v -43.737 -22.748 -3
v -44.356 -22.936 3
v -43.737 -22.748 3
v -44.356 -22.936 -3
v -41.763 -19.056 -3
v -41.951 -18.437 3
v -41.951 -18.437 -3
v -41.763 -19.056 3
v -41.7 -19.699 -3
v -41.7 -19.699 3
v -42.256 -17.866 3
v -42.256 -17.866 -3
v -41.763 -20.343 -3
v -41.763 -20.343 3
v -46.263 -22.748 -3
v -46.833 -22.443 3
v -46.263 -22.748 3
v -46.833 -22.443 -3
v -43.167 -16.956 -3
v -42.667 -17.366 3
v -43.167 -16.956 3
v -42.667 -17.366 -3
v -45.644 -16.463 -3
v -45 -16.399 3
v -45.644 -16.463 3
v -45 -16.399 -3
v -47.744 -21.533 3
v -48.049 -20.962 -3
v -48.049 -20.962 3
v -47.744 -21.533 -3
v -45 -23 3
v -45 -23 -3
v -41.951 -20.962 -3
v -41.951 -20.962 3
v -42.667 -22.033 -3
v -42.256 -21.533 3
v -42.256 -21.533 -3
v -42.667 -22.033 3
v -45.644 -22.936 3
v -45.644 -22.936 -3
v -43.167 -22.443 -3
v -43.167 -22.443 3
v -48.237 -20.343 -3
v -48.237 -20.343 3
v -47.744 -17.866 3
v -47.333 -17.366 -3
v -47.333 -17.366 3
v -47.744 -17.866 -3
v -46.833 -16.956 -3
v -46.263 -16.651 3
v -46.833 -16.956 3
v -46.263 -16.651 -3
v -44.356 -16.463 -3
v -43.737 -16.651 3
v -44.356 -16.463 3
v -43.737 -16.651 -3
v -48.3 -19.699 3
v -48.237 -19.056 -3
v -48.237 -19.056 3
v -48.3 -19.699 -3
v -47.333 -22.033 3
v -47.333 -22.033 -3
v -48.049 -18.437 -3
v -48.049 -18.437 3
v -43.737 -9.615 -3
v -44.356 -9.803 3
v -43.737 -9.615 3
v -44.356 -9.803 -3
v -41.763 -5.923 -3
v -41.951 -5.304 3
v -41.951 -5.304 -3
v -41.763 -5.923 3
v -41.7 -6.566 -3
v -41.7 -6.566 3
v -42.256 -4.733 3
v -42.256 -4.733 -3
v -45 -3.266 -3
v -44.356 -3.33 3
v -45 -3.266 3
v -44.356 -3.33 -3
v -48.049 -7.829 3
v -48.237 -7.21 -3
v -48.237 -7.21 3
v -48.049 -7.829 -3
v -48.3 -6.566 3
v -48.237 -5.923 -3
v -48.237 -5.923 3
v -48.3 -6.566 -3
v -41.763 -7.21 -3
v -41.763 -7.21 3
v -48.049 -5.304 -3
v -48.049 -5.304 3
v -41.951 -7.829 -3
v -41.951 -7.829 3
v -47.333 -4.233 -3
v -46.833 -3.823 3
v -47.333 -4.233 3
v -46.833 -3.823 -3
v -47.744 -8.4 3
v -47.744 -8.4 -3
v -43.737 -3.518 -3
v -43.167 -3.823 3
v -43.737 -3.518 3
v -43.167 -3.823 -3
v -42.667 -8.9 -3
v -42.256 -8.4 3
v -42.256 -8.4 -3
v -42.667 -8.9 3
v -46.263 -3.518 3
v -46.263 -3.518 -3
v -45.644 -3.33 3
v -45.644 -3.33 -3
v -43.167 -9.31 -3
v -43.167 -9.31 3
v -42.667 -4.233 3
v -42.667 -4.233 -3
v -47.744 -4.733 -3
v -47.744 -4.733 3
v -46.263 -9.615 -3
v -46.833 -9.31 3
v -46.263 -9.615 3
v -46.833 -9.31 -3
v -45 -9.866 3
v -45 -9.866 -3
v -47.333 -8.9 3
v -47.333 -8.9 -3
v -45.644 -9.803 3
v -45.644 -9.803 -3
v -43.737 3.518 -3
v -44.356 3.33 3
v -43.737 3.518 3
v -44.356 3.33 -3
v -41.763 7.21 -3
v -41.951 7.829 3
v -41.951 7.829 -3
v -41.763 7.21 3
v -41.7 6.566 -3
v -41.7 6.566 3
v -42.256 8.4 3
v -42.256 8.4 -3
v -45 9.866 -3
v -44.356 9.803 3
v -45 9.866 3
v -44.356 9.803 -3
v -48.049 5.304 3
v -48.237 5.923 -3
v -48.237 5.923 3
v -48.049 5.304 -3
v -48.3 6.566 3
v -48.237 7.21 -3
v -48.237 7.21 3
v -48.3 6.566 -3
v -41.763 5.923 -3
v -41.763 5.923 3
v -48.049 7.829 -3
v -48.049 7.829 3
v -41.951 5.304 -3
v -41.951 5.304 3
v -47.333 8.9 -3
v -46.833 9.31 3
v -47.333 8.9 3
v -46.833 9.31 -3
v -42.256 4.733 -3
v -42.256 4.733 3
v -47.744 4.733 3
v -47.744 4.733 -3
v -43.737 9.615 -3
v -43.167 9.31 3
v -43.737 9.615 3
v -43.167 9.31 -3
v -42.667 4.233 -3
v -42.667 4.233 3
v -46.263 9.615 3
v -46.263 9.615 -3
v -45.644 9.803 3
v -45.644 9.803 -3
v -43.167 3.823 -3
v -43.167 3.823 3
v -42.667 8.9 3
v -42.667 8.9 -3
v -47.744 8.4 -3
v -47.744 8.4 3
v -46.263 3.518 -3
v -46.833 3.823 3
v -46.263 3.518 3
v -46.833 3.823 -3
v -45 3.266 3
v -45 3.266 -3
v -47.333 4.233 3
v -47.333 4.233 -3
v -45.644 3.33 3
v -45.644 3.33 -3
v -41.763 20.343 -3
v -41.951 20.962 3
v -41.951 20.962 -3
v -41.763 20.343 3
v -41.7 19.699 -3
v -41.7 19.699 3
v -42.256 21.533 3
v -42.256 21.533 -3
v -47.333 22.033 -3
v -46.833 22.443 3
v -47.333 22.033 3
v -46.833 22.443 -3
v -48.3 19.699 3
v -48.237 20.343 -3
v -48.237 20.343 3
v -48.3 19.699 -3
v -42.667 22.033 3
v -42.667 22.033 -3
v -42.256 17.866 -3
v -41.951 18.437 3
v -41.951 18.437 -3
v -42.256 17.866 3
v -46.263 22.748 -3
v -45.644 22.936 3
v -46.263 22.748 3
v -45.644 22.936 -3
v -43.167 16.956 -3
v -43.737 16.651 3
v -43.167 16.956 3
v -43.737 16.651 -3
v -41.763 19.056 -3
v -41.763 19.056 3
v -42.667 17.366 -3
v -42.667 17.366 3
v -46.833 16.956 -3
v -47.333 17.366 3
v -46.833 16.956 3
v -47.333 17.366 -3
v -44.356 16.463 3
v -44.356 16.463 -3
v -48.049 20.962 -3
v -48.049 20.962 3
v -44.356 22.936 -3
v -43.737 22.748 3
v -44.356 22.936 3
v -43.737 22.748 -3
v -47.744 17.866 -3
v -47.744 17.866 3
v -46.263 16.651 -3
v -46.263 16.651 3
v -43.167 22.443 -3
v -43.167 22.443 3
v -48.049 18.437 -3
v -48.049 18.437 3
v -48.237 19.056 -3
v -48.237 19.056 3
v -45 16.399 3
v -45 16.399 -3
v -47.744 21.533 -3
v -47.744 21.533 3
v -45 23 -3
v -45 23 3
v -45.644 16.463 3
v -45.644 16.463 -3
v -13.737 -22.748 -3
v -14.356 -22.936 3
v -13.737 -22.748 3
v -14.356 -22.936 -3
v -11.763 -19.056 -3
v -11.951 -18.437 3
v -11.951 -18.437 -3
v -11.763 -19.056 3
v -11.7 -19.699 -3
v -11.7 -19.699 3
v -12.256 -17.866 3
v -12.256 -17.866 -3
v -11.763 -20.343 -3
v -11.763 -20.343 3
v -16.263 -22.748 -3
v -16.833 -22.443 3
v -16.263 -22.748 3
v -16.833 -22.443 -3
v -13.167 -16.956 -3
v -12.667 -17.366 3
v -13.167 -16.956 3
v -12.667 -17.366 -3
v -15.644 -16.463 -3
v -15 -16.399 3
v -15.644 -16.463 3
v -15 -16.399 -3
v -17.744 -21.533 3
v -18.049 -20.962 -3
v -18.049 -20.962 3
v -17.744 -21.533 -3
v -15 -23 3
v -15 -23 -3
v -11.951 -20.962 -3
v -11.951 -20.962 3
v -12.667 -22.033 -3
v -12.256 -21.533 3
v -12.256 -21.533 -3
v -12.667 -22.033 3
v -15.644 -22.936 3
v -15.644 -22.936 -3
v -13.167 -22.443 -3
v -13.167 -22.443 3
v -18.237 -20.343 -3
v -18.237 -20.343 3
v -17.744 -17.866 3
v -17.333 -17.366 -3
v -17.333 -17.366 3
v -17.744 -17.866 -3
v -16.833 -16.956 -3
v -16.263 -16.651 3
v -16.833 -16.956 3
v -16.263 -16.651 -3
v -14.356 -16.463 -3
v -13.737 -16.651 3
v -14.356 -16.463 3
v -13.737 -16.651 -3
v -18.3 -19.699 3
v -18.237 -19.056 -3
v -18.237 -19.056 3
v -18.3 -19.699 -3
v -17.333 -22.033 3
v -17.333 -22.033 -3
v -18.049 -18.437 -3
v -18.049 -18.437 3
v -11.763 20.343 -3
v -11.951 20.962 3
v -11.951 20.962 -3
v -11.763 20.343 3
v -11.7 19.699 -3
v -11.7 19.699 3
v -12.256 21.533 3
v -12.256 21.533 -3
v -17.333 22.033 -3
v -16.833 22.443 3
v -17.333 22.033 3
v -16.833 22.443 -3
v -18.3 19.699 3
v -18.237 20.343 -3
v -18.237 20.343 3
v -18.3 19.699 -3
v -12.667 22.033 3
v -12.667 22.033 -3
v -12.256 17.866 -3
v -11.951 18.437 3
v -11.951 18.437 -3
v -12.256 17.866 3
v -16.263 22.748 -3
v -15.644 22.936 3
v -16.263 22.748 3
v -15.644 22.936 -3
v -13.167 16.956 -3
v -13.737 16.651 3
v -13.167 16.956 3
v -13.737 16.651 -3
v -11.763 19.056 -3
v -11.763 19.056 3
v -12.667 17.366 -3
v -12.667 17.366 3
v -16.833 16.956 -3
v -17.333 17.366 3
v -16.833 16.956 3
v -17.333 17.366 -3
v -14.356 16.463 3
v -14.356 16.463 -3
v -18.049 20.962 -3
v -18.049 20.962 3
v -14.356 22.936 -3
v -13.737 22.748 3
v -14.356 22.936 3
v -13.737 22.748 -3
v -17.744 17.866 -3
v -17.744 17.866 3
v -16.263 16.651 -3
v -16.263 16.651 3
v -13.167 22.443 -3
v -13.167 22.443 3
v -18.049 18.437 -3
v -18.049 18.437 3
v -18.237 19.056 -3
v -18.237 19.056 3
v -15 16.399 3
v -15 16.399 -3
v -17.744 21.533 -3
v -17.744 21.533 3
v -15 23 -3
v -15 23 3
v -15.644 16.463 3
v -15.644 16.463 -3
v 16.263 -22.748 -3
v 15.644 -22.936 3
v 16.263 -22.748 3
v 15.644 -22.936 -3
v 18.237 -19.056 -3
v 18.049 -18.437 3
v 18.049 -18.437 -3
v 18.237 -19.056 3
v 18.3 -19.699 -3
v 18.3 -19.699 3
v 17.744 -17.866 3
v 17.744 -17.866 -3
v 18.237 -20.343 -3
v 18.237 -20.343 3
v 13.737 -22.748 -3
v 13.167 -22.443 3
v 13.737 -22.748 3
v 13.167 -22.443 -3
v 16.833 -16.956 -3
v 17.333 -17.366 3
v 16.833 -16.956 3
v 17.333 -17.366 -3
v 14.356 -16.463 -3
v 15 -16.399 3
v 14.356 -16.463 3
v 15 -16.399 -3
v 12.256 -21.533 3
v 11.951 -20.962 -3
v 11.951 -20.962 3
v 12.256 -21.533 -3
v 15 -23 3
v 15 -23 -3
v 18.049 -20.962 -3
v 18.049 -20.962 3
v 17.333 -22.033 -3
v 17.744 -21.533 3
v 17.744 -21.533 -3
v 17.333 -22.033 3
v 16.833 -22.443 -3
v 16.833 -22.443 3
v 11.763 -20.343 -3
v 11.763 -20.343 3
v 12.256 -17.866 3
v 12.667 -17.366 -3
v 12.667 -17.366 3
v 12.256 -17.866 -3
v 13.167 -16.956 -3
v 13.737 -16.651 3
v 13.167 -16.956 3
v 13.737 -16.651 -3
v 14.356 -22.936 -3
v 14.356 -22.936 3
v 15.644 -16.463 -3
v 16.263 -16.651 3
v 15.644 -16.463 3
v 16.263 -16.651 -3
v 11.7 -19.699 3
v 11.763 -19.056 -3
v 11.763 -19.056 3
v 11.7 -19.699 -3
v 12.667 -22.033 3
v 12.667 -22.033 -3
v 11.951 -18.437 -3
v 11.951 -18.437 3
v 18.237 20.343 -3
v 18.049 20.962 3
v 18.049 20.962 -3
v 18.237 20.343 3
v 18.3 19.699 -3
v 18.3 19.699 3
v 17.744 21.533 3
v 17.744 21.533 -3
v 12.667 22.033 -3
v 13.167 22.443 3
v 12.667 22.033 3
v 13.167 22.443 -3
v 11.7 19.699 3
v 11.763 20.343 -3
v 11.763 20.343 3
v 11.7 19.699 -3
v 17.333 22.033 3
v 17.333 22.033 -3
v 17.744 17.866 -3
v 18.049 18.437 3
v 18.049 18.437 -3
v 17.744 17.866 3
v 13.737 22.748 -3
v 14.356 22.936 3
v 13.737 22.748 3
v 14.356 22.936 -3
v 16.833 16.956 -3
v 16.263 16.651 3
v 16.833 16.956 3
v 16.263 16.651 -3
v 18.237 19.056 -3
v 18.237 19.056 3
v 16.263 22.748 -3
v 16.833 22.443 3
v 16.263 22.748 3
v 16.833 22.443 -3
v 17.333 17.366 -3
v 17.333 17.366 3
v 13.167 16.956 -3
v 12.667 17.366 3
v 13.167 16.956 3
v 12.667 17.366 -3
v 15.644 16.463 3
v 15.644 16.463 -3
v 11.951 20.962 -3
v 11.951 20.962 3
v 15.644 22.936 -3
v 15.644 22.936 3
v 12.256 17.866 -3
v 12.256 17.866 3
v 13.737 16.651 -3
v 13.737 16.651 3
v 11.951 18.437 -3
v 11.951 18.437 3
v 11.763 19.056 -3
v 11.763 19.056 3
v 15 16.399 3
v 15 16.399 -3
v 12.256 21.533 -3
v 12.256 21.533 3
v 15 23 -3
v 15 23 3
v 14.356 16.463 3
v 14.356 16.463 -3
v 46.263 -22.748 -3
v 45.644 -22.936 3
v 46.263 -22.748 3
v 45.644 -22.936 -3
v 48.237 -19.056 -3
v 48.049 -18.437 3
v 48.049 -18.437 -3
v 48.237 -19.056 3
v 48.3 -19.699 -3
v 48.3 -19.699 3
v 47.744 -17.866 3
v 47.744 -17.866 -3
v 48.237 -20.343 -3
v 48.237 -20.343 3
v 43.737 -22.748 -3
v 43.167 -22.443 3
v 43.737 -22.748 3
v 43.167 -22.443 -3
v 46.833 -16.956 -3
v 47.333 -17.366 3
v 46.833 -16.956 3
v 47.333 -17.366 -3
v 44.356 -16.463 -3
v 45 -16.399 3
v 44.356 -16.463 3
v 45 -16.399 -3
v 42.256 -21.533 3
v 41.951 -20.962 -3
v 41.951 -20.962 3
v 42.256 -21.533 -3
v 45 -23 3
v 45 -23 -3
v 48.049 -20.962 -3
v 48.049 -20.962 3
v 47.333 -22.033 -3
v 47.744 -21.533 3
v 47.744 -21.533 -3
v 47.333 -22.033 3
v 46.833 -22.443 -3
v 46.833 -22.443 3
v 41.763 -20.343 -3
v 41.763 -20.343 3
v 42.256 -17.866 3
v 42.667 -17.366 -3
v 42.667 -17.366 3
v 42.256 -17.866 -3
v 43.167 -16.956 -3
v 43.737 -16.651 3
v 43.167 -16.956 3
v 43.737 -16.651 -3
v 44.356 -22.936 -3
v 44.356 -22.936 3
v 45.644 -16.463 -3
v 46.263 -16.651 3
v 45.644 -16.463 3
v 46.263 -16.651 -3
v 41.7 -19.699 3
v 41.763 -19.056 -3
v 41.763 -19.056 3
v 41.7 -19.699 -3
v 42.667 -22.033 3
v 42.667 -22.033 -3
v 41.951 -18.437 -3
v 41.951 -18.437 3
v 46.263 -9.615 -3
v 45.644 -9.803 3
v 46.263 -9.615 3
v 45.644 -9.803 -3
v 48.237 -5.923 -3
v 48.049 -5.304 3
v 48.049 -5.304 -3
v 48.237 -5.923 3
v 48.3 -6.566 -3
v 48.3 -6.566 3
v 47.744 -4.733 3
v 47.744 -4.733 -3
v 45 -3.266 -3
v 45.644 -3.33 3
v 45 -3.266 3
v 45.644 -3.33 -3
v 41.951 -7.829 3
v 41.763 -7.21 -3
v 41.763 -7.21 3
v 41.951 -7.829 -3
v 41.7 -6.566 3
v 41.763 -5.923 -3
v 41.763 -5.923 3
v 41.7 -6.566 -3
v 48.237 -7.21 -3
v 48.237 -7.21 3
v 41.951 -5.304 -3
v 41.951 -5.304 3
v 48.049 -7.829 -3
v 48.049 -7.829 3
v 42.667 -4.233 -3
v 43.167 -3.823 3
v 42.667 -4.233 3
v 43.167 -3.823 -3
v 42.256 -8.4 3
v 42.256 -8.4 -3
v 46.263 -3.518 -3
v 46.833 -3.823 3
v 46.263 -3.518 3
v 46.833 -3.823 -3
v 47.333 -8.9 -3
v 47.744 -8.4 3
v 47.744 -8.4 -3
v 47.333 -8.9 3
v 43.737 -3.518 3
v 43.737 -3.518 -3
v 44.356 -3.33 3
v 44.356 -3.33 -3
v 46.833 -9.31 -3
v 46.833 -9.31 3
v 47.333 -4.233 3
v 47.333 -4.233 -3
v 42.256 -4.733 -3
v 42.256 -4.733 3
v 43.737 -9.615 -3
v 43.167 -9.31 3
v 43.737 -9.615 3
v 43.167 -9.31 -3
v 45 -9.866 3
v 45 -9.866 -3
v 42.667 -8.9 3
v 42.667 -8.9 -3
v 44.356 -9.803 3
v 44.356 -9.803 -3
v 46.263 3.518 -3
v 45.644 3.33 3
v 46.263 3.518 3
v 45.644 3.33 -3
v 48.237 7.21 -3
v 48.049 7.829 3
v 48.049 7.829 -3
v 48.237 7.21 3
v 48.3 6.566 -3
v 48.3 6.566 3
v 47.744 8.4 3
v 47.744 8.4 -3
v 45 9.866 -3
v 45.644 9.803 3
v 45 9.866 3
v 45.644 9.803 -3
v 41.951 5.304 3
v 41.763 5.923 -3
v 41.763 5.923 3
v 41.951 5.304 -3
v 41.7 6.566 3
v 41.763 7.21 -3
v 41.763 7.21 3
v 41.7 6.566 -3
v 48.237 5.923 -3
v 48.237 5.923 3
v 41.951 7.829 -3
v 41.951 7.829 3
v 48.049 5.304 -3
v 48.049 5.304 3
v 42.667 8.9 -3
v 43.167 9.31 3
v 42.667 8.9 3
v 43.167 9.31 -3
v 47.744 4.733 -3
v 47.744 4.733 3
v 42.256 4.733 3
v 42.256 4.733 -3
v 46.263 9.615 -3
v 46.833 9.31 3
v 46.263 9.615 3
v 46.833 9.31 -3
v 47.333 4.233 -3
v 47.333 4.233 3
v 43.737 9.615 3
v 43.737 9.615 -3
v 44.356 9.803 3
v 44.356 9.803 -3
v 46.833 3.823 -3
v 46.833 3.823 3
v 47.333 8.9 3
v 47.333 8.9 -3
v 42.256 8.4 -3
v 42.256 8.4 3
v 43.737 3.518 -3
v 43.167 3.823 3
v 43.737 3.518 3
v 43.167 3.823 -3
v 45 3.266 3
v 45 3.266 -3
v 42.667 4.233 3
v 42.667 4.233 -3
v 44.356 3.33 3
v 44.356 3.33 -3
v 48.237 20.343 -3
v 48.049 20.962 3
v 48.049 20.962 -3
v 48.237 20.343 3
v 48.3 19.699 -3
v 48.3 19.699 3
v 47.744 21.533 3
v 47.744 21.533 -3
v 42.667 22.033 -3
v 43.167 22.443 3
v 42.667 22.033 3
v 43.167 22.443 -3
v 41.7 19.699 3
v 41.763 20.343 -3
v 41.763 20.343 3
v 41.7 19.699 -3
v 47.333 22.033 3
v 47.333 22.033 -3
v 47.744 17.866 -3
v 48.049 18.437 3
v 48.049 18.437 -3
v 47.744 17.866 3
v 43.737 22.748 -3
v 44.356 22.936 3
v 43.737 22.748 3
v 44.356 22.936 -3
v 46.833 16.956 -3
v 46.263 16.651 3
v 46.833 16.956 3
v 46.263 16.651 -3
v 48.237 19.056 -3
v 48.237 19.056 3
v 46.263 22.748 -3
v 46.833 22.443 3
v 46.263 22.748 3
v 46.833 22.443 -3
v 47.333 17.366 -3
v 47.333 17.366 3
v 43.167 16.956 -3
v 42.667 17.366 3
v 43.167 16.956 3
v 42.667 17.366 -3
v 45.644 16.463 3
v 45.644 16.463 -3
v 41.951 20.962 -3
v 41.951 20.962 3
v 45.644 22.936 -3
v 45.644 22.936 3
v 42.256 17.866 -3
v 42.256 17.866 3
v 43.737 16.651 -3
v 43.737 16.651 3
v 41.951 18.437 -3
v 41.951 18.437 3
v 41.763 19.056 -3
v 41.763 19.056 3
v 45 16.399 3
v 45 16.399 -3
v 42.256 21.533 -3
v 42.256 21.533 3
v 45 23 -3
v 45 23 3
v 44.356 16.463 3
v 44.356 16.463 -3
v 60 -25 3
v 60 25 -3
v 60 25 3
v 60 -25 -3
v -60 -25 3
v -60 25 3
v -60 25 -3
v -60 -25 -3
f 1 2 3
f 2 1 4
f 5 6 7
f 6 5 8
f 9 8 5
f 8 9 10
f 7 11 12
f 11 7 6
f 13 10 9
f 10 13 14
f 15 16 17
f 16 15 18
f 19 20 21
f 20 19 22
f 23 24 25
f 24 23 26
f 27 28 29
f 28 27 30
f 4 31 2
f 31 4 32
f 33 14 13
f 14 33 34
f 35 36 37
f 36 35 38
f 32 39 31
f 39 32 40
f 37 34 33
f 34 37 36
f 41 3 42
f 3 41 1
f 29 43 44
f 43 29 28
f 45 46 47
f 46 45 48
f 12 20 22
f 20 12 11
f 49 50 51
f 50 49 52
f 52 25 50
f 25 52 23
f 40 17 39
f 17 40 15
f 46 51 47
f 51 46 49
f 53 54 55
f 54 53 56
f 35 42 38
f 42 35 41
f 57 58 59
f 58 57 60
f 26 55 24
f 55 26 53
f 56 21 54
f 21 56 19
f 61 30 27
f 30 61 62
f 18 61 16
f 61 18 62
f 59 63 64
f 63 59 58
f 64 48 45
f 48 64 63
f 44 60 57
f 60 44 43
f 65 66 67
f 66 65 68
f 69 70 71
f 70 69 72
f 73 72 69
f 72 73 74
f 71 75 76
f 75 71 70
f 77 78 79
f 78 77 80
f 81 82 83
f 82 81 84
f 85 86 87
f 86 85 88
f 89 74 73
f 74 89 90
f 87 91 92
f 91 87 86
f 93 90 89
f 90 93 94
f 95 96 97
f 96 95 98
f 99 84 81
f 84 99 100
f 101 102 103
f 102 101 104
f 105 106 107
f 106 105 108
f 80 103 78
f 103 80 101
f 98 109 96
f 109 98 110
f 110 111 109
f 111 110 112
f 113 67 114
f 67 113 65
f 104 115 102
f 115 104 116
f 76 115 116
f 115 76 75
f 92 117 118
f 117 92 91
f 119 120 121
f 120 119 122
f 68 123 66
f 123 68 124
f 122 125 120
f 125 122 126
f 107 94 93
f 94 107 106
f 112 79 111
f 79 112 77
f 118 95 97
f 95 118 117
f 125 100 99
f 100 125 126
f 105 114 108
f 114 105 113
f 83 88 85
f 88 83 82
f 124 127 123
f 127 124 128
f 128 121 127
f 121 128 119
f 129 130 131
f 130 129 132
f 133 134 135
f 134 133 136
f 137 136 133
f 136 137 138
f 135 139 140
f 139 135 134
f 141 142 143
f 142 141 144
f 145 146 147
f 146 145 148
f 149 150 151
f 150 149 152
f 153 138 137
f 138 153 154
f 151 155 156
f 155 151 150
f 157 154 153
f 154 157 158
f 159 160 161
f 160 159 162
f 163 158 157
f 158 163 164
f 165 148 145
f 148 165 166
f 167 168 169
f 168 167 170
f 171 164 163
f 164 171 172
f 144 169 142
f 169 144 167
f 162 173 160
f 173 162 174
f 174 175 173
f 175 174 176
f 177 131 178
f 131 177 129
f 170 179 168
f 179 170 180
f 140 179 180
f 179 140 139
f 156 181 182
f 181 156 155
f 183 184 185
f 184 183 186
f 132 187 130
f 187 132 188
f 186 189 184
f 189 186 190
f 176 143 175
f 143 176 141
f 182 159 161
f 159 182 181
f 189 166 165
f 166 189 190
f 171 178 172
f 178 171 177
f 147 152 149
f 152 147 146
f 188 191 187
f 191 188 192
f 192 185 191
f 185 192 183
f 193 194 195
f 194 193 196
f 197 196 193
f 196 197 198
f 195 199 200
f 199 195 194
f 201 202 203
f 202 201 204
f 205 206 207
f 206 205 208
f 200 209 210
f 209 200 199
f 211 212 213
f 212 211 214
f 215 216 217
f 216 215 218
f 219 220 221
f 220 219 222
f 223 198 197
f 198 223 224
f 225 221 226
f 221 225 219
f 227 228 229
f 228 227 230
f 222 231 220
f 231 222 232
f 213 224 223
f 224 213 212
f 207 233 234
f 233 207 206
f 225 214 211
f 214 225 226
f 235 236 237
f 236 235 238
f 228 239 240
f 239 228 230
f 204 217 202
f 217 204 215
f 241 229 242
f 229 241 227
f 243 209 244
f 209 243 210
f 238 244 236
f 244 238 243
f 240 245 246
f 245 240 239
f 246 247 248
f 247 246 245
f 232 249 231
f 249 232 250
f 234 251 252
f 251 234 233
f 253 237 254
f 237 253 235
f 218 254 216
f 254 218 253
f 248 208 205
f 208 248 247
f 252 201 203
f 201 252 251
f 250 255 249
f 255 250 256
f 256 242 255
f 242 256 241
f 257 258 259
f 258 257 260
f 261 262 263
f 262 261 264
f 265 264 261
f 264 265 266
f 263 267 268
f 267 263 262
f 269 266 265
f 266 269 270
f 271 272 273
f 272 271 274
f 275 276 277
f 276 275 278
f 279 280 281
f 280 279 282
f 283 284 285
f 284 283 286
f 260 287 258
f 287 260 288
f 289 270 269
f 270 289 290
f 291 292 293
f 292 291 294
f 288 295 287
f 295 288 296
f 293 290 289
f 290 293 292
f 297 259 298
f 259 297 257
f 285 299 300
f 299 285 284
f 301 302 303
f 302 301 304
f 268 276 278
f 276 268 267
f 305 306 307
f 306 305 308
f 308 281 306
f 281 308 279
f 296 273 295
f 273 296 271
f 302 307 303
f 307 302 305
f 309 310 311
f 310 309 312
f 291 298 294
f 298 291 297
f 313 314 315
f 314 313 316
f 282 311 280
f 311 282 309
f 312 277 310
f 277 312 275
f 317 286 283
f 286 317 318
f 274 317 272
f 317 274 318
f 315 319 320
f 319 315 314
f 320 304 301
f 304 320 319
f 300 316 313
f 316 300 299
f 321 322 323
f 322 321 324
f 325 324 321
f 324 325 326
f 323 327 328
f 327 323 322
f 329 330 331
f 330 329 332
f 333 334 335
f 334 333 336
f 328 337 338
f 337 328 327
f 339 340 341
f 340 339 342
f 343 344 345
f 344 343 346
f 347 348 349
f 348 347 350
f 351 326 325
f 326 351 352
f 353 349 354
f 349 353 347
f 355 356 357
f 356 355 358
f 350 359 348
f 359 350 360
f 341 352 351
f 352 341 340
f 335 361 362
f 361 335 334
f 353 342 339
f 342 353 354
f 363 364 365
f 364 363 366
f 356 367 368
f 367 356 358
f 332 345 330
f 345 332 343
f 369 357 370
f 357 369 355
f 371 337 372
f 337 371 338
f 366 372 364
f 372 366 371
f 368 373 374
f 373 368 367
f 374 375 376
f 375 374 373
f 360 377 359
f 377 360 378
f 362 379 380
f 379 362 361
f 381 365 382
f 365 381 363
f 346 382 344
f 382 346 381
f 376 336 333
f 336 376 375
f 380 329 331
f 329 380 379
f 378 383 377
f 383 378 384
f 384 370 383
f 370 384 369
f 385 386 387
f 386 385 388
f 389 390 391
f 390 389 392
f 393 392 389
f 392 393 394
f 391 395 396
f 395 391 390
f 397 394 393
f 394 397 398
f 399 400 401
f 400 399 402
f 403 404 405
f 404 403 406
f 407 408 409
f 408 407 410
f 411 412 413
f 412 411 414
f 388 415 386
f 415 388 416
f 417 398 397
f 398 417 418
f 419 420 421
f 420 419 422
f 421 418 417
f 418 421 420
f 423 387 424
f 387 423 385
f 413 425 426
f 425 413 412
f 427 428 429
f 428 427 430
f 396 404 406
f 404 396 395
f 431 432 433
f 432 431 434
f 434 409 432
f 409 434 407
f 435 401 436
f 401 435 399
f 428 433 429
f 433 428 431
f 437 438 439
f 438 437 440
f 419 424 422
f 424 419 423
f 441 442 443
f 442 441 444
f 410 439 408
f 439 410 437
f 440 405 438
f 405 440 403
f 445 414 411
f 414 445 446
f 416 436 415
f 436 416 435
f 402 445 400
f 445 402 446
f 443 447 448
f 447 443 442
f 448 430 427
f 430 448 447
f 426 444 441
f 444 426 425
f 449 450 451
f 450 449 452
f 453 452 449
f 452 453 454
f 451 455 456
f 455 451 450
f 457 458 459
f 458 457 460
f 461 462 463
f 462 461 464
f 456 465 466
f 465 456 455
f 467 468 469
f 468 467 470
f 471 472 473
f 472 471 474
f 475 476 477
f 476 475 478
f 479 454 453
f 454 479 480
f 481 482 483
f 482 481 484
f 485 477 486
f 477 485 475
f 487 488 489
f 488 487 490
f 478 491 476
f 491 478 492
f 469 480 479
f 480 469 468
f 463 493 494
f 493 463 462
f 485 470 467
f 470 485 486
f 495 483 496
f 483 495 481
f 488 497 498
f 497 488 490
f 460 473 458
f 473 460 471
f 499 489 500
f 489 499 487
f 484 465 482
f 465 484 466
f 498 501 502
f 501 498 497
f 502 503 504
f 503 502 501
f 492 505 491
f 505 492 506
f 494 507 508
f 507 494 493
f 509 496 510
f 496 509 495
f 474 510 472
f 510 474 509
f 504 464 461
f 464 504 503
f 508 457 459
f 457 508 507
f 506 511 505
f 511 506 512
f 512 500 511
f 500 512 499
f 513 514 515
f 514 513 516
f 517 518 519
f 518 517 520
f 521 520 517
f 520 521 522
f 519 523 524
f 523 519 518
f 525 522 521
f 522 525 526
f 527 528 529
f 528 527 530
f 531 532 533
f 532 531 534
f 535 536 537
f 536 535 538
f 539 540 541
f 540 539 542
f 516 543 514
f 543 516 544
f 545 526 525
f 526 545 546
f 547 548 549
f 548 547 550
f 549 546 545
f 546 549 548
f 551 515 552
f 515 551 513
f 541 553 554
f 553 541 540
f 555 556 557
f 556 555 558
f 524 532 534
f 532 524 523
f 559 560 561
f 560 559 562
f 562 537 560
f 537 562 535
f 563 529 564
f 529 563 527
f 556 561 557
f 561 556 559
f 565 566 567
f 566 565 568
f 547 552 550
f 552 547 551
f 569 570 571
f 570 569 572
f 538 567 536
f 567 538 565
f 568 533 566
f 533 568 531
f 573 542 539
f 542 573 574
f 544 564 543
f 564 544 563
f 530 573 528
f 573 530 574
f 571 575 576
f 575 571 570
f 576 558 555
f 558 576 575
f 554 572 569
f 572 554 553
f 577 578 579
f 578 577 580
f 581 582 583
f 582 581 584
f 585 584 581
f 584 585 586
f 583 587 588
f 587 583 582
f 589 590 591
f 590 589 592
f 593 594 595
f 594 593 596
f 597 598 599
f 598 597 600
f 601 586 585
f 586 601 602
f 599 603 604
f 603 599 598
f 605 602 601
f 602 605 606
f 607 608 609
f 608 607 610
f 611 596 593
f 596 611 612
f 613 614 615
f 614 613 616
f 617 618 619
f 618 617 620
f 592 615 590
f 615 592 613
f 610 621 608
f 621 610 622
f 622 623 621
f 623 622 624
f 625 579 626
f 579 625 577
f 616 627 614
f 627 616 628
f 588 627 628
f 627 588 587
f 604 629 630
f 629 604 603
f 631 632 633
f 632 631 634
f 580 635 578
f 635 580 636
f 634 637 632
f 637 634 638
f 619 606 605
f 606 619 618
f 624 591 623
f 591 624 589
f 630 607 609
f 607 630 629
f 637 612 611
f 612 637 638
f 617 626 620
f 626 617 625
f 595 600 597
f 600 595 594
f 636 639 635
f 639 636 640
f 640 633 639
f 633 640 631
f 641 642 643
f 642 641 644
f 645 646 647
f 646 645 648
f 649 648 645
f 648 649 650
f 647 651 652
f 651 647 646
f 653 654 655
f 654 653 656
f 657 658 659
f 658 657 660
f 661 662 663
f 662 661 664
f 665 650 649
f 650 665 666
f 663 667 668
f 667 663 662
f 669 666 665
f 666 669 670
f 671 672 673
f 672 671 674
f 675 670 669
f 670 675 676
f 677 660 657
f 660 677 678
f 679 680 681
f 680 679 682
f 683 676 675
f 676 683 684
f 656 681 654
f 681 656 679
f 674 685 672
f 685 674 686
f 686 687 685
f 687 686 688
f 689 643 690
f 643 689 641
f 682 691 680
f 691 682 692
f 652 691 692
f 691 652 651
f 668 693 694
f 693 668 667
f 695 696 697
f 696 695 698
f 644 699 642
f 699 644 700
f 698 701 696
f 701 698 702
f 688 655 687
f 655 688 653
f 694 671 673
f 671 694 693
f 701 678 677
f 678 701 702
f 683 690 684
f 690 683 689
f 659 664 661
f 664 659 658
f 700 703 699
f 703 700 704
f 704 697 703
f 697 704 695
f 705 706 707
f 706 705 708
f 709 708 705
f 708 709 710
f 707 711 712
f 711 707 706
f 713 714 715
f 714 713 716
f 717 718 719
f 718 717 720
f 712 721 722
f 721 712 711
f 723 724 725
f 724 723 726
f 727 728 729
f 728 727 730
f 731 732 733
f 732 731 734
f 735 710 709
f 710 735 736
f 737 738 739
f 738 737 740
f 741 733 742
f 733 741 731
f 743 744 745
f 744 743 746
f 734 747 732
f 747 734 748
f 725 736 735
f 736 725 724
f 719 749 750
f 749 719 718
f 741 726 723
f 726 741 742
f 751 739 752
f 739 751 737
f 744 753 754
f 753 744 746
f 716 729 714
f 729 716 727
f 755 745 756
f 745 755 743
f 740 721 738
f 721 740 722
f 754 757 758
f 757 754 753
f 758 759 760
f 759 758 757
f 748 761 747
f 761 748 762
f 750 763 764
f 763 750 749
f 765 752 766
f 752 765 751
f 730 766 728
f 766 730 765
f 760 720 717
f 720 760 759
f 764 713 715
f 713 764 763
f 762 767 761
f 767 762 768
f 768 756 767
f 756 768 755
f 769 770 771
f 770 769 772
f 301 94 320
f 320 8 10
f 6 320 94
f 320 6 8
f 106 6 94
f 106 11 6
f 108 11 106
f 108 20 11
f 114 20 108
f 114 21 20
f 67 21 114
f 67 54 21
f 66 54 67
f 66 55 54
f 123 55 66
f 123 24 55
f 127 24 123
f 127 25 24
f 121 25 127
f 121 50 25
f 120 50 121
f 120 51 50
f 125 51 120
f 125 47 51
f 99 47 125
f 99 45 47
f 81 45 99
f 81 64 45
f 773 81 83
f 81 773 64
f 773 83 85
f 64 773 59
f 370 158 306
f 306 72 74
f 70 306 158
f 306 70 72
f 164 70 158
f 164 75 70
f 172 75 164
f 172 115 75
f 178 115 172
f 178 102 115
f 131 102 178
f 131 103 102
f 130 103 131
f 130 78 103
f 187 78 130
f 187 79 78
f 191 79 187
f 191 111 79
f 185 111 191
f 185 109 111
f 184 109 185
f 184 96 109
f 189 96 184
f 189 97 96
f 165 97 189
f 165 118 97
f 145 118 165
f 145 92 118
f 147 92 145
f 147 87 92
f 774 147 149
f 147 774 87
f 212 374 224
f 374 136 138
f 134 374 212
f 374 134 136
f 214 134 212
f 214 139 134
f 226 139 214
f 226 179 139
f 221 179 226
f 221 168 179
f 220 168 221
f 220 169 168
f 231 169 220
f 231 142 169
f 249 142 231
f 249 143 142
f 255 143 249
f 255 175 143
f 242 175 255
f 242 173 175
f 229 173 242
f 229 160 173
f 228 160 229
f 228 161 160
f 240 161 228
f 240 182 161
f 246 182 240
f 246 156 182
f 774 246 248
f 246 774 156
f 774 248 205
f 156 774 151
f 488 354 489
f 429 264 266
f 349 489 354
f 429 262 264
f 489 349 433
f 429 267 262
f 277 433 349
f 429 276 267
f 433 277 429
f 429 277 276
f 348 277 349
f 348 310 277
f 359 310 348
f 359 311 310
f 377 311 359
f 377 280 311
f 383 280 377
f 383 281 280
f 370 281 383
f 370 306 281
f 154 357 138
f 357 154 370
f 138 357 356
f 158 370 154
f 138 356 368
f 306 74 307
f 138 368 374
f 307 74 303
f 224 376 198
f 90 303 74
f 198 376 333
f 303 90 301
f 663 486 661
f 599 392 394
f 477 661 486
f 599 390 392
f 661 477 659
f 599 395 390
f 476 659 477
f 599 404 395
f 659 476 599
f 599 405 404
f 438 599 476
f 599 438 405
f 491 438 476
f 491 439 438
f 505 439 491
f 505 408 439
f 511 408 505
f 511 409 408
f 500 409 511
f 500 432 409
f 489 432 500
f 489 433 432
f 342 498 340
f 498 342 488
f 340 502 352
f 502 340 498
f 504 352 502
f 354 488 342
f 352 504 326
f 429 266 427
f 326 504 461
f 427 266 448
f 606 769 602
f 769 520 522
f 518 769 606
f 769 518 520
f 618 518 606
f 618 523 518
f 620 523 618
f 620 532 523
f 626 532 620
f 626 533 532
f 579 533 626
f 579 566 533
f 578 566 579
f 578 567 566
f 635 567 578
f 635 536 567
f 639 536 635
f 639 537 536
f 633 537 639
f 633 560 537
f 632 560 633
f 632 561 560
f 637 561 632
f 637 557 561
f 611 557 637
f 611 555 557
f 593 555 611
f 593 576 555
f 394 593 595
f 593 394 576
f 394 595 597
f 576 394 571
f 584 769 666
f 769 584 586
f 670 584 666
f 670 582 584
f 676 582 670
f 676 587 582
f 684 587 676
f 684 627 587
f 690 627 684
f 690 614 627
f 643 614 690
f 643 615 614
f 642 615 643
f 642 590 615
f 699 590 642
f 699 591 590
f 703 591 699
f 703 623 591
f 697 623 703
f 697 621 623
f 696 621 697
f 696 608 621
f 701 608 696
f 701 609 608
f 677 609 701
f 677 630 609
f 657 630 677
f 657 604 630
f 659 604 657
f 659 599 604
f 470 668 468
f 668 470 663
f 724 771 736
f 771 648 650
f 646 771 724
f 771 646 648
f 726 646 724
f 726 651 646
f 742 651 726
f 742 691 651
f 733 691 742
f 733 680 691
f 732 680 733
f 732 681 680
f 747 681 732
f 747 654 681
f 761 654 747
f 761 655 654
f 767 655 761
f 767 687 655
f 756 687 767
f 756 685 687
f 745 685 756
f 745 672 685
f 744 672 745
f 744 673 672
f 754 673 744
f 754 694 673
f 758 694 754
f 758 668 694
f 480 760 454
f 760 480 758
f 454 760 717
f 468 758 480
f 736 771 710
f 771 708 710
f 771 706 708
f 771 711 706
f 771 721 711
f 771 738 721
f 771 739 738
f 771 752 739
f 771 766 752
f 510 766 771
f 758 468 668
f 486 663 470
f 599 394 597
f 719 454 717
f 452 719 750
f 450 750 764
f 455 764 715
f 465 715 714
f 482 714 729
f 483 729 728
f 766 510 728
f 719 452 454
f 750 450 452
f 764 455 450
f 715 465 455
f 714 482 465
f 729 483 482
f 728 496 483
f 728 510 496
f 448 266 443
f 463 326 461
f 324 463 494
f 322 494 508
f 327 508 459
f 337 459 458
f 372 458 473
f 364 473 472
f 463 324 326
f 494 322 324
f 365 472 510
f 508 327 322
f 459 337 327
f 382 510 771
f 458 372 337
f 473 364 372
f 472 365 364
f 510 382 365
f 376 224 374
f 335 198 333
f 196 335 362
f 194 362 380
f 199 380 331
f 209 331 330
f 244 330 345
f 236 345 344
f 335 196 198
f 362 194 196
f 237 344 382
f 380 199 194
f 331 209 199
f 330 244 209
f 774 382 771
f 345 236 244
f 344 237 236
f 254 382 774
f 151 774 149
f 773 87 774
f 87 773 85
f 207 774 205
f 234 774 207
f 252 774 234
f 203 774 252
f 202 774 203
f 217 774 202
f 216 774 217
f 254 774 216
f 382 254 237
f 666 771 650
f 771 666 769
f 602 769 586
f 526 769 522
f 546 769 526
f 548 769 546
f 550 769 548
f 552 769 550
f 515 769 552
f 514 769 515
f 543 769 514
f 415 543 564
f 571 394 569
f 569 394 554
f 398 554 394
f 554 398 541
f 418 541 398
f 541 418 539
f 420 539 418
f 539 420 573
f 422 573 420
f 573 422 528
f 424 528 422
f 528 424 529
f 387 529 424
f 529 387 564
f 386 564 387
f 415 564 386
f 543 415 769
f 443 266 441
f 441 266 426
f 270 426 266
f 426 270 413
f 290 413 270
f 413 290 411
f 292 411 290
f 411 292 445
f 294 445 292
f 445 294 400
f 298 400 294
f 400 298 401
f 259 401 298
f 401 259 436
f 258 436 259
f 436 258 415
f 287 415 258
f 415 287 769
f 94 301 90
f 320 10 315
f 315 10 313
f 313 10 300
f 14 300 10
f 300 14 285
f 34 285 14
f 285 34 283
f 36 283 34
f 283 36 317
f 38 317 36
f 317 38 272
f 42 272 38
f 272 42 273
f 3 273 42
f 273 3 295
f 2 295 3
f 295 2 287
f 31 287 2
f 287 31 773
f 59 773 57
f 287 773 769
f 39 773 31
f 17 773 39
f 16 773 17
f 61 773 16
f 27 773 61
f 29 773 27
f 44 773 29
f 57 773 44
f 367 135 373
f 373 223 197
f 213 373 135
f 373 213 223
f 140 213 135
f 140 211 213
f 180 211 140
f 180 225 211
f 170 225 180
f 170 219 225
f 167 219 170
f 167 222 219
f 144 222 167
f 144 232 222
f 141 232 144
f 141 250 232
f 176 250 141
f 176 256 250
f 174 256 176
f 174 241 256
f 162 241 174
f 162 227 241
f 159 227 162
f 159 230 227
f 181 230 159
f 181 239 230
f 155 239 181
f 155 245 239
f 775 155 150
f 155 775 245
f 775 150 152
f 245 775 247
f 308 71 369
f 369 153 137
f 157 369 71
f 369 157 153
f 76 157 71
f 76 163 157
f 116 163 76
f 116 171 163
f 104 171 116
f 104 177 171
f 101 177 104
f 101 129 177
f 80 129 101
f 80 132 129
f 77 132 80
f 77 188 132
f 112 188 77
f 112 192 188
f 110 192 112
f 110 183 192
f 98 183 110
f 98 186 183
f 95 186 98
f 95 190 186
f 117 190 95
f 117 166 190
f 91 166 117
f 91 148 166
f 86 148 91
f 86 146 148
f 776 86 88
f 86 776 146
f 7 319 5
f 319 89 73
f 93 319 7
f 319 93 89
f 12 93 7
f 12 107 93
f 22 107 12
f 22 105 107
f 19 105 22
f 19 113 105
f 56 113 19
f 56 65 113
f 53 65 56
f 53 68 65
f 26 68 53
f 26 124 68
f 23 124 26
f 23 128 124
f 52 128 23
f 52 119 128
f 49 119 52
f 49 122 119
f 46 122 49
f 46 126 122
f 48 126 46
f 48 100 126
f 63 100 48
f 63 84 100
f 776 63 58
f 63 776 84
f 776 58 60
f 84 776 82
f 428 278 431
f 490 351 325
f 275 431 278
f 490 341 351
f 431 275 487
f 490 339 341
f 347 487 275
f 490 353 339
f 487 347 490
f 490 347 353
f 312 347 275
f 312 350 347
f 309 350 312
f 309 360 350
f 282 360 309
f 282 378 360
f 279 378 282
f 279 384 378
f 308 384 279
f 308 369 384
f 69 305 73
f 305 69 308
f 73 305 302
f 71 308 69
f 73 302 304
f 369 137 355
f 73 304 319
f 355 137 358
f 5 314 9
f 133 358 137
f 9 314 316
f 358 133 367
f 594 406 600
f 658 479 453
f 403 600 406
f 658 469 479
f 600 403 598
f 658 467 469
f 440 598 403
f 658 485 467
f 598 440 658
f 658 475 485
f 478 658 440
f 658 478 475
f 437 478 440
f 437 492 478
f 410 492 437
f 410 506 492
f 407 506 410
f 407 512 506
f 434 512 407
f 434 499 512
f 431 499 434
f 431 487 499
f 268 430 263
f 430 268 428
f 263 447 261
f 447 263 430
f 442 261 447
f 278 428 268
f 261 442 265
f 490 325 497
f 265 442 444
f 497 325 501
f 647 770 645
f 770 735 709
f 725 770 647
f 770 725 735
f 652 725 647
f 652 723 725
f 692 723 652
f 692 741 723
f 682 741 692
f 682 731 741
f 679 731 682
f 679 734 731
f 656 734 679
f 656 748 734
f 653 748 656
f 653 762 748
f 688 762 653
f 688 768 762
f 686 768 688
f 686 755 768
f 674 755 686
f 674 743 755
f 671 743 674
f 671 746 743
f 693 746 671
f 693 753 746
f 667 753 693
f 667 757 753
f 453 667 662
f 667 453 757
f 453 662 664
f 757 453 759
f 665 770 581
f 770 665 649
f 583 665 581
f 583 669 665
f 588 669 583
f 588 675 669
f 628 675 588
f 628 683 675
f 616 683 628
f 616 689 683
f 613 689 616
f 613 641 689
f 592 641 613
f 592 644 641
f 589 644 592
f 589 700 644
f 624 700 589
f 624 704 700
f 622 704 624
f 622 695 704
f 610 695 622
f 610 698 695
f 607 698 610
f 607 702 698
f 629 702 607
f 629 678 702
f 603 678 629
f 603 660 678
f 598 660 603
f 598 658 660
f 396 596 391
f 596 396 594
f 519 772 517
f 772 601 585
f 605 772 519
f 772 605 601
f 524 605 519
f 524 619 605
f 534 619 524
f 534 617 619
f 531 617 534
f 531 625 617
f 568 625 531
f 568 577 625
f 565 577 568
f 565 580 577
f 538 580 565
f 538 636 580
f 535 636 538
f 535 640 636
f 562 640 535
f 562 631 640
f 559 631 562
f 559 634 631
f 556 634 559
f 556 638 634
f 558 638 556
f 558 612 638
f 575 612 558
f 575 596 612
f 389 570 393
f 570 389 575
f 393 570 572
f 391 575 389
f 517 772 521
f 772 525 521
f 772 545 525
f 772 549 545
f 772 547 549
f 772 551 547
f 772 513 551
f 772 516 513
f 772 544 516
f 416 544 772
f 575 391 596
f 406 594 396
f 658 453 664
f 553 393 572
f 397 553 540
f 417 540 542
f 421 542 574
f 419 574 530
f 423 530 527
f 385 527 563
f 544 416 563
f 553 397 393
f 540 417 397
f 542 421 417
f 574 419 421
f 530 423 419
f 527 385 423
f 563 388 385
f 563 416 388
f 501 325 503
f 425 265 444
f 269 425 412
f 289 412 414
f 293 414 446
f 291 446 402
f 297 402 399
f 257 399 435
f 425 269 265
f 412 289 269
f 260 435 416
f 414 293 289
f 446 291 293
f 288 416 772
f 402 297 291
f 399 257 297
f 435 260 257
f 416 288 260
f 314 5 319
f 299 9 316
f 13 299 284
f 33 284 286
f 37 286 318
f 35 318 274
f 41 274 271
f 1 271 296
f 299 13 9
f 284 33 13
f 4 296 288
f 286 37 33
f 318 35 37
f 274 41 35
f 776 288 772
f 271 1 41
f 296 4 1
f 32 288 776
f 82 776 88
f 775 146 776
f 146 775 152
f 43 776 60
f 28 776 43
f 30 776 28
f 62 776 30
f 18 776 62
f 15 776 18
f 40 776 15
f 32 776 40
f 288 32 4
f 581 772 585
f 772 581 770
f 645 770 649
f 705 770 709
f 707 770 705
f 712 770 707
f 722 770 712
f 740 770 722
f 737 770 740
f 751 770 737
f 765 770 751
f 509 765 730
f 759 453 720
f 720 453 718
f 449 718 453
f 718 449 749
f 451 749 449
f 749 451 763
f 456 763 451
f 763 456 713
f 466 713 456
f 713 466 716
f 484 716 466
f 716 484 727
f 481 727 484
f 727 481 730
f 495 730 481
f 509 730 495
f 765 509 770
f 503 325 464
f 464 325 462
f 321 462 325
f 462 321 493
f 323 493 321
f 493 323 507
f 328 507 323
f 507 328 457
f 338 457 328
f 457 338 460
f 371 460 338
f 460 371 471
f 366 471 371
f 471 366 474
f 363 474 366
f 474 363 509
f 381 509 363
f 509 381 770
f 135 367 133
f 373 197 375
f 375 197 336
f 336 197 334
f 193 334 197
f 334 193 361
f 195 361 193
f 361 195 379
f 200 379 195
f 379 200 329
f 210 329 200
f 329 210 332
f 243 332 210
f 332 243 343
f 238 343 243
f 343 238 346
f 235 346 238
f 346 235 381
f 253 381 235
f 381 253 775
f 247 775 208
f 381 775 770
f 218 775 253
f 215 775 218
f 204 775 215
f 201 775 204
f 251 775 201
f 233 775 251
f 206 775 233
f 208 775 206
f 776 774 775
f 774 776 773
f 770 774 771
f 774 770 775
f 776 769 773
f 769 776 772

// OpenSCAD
$fn = 32;

// ----------------------------------------------------------------------
// Perforated panel 120 x 50 x 6
// 4 x 4 Ø6.6 holes, frame layout
// ----------------------------------------------------------------------

// --- parameters (mm) ---
panel = [120, 50, 6];  // overall size (x, y, z)
hole_d = 6.6;          // hole diameter
pitch_x = 30;          // hole pitch along X
pitch_y = 13.133;      // hole pitch along Y

// --- derived feature positions (mm) ---
margin = hole_d / 2 + 2;            // = 5.3   clearance from the panel edge
cols = floor((panel[0] - 2 * margin) / pitch_x) + 1;  // = 4   how many columns fit in X
rows = floor((panel[1] - 2 * margin) / pitch_y) + 1;  // = 4   how many rows fit in Y
span_x = (cols - 1) * pitch_x + 0;  // = 90   width of the field
span_y = (rows - 1) * pitch_y;      // = 39.4   height of the field
origin_x = -span_x / 2;             // = -45   X of the first hole
origin_y = -span_y / 2;             // = -19.7   Y of the first row
holes = 2 * cols + 2 * (rows - 2);  // = 12   holes around the frame
feature_centers = [
  [origin_x + 0 * pitch_x, origin_y + 0 * pitch_y],
  [origin_x + 0 * pitch_x, origin_y + 1 * pitch_y],
  [origin_x + 0 * pitch_x, origin_y + 2 * pitch_y],
  [origin_x + 0 * pitch_x, origin_y + 3 * pitch_y],
  [origin_x + 1 * pitch_x, origin_y + 0 * pitch_y],
  [origin_x + 1 * pitch_x, origin_y + 3 * pitch_y],
  [origin_x + 2 * pitch_x, origin_y + 0 * pitch_y],
  [origin_x + 2 * pitch_x, origin_y + 3 * pitch_y],
  [origin_x + 3 * pitch_x, origin_y + 0 * pitch_y],
  [origin_x + 3 * pitch_x, origin_y + 1 * pitch_y],
  [origin_x + 3 * pitch_x, origin_y + 2 * pitch_y],
  [origin_x + 3 * pitch_x, origin_y + 3 * pitch_y]
];   // hole centres, used verbatim by the cutter loop

// panel outline, every hole through
difference() {
  cube(panel, center = true);
  for (centre = feature_centers)
    translate([centre[0], centre[1], 0])
      cylinder(d = hole_d, h = panel[2] + 2, center = true);
}
